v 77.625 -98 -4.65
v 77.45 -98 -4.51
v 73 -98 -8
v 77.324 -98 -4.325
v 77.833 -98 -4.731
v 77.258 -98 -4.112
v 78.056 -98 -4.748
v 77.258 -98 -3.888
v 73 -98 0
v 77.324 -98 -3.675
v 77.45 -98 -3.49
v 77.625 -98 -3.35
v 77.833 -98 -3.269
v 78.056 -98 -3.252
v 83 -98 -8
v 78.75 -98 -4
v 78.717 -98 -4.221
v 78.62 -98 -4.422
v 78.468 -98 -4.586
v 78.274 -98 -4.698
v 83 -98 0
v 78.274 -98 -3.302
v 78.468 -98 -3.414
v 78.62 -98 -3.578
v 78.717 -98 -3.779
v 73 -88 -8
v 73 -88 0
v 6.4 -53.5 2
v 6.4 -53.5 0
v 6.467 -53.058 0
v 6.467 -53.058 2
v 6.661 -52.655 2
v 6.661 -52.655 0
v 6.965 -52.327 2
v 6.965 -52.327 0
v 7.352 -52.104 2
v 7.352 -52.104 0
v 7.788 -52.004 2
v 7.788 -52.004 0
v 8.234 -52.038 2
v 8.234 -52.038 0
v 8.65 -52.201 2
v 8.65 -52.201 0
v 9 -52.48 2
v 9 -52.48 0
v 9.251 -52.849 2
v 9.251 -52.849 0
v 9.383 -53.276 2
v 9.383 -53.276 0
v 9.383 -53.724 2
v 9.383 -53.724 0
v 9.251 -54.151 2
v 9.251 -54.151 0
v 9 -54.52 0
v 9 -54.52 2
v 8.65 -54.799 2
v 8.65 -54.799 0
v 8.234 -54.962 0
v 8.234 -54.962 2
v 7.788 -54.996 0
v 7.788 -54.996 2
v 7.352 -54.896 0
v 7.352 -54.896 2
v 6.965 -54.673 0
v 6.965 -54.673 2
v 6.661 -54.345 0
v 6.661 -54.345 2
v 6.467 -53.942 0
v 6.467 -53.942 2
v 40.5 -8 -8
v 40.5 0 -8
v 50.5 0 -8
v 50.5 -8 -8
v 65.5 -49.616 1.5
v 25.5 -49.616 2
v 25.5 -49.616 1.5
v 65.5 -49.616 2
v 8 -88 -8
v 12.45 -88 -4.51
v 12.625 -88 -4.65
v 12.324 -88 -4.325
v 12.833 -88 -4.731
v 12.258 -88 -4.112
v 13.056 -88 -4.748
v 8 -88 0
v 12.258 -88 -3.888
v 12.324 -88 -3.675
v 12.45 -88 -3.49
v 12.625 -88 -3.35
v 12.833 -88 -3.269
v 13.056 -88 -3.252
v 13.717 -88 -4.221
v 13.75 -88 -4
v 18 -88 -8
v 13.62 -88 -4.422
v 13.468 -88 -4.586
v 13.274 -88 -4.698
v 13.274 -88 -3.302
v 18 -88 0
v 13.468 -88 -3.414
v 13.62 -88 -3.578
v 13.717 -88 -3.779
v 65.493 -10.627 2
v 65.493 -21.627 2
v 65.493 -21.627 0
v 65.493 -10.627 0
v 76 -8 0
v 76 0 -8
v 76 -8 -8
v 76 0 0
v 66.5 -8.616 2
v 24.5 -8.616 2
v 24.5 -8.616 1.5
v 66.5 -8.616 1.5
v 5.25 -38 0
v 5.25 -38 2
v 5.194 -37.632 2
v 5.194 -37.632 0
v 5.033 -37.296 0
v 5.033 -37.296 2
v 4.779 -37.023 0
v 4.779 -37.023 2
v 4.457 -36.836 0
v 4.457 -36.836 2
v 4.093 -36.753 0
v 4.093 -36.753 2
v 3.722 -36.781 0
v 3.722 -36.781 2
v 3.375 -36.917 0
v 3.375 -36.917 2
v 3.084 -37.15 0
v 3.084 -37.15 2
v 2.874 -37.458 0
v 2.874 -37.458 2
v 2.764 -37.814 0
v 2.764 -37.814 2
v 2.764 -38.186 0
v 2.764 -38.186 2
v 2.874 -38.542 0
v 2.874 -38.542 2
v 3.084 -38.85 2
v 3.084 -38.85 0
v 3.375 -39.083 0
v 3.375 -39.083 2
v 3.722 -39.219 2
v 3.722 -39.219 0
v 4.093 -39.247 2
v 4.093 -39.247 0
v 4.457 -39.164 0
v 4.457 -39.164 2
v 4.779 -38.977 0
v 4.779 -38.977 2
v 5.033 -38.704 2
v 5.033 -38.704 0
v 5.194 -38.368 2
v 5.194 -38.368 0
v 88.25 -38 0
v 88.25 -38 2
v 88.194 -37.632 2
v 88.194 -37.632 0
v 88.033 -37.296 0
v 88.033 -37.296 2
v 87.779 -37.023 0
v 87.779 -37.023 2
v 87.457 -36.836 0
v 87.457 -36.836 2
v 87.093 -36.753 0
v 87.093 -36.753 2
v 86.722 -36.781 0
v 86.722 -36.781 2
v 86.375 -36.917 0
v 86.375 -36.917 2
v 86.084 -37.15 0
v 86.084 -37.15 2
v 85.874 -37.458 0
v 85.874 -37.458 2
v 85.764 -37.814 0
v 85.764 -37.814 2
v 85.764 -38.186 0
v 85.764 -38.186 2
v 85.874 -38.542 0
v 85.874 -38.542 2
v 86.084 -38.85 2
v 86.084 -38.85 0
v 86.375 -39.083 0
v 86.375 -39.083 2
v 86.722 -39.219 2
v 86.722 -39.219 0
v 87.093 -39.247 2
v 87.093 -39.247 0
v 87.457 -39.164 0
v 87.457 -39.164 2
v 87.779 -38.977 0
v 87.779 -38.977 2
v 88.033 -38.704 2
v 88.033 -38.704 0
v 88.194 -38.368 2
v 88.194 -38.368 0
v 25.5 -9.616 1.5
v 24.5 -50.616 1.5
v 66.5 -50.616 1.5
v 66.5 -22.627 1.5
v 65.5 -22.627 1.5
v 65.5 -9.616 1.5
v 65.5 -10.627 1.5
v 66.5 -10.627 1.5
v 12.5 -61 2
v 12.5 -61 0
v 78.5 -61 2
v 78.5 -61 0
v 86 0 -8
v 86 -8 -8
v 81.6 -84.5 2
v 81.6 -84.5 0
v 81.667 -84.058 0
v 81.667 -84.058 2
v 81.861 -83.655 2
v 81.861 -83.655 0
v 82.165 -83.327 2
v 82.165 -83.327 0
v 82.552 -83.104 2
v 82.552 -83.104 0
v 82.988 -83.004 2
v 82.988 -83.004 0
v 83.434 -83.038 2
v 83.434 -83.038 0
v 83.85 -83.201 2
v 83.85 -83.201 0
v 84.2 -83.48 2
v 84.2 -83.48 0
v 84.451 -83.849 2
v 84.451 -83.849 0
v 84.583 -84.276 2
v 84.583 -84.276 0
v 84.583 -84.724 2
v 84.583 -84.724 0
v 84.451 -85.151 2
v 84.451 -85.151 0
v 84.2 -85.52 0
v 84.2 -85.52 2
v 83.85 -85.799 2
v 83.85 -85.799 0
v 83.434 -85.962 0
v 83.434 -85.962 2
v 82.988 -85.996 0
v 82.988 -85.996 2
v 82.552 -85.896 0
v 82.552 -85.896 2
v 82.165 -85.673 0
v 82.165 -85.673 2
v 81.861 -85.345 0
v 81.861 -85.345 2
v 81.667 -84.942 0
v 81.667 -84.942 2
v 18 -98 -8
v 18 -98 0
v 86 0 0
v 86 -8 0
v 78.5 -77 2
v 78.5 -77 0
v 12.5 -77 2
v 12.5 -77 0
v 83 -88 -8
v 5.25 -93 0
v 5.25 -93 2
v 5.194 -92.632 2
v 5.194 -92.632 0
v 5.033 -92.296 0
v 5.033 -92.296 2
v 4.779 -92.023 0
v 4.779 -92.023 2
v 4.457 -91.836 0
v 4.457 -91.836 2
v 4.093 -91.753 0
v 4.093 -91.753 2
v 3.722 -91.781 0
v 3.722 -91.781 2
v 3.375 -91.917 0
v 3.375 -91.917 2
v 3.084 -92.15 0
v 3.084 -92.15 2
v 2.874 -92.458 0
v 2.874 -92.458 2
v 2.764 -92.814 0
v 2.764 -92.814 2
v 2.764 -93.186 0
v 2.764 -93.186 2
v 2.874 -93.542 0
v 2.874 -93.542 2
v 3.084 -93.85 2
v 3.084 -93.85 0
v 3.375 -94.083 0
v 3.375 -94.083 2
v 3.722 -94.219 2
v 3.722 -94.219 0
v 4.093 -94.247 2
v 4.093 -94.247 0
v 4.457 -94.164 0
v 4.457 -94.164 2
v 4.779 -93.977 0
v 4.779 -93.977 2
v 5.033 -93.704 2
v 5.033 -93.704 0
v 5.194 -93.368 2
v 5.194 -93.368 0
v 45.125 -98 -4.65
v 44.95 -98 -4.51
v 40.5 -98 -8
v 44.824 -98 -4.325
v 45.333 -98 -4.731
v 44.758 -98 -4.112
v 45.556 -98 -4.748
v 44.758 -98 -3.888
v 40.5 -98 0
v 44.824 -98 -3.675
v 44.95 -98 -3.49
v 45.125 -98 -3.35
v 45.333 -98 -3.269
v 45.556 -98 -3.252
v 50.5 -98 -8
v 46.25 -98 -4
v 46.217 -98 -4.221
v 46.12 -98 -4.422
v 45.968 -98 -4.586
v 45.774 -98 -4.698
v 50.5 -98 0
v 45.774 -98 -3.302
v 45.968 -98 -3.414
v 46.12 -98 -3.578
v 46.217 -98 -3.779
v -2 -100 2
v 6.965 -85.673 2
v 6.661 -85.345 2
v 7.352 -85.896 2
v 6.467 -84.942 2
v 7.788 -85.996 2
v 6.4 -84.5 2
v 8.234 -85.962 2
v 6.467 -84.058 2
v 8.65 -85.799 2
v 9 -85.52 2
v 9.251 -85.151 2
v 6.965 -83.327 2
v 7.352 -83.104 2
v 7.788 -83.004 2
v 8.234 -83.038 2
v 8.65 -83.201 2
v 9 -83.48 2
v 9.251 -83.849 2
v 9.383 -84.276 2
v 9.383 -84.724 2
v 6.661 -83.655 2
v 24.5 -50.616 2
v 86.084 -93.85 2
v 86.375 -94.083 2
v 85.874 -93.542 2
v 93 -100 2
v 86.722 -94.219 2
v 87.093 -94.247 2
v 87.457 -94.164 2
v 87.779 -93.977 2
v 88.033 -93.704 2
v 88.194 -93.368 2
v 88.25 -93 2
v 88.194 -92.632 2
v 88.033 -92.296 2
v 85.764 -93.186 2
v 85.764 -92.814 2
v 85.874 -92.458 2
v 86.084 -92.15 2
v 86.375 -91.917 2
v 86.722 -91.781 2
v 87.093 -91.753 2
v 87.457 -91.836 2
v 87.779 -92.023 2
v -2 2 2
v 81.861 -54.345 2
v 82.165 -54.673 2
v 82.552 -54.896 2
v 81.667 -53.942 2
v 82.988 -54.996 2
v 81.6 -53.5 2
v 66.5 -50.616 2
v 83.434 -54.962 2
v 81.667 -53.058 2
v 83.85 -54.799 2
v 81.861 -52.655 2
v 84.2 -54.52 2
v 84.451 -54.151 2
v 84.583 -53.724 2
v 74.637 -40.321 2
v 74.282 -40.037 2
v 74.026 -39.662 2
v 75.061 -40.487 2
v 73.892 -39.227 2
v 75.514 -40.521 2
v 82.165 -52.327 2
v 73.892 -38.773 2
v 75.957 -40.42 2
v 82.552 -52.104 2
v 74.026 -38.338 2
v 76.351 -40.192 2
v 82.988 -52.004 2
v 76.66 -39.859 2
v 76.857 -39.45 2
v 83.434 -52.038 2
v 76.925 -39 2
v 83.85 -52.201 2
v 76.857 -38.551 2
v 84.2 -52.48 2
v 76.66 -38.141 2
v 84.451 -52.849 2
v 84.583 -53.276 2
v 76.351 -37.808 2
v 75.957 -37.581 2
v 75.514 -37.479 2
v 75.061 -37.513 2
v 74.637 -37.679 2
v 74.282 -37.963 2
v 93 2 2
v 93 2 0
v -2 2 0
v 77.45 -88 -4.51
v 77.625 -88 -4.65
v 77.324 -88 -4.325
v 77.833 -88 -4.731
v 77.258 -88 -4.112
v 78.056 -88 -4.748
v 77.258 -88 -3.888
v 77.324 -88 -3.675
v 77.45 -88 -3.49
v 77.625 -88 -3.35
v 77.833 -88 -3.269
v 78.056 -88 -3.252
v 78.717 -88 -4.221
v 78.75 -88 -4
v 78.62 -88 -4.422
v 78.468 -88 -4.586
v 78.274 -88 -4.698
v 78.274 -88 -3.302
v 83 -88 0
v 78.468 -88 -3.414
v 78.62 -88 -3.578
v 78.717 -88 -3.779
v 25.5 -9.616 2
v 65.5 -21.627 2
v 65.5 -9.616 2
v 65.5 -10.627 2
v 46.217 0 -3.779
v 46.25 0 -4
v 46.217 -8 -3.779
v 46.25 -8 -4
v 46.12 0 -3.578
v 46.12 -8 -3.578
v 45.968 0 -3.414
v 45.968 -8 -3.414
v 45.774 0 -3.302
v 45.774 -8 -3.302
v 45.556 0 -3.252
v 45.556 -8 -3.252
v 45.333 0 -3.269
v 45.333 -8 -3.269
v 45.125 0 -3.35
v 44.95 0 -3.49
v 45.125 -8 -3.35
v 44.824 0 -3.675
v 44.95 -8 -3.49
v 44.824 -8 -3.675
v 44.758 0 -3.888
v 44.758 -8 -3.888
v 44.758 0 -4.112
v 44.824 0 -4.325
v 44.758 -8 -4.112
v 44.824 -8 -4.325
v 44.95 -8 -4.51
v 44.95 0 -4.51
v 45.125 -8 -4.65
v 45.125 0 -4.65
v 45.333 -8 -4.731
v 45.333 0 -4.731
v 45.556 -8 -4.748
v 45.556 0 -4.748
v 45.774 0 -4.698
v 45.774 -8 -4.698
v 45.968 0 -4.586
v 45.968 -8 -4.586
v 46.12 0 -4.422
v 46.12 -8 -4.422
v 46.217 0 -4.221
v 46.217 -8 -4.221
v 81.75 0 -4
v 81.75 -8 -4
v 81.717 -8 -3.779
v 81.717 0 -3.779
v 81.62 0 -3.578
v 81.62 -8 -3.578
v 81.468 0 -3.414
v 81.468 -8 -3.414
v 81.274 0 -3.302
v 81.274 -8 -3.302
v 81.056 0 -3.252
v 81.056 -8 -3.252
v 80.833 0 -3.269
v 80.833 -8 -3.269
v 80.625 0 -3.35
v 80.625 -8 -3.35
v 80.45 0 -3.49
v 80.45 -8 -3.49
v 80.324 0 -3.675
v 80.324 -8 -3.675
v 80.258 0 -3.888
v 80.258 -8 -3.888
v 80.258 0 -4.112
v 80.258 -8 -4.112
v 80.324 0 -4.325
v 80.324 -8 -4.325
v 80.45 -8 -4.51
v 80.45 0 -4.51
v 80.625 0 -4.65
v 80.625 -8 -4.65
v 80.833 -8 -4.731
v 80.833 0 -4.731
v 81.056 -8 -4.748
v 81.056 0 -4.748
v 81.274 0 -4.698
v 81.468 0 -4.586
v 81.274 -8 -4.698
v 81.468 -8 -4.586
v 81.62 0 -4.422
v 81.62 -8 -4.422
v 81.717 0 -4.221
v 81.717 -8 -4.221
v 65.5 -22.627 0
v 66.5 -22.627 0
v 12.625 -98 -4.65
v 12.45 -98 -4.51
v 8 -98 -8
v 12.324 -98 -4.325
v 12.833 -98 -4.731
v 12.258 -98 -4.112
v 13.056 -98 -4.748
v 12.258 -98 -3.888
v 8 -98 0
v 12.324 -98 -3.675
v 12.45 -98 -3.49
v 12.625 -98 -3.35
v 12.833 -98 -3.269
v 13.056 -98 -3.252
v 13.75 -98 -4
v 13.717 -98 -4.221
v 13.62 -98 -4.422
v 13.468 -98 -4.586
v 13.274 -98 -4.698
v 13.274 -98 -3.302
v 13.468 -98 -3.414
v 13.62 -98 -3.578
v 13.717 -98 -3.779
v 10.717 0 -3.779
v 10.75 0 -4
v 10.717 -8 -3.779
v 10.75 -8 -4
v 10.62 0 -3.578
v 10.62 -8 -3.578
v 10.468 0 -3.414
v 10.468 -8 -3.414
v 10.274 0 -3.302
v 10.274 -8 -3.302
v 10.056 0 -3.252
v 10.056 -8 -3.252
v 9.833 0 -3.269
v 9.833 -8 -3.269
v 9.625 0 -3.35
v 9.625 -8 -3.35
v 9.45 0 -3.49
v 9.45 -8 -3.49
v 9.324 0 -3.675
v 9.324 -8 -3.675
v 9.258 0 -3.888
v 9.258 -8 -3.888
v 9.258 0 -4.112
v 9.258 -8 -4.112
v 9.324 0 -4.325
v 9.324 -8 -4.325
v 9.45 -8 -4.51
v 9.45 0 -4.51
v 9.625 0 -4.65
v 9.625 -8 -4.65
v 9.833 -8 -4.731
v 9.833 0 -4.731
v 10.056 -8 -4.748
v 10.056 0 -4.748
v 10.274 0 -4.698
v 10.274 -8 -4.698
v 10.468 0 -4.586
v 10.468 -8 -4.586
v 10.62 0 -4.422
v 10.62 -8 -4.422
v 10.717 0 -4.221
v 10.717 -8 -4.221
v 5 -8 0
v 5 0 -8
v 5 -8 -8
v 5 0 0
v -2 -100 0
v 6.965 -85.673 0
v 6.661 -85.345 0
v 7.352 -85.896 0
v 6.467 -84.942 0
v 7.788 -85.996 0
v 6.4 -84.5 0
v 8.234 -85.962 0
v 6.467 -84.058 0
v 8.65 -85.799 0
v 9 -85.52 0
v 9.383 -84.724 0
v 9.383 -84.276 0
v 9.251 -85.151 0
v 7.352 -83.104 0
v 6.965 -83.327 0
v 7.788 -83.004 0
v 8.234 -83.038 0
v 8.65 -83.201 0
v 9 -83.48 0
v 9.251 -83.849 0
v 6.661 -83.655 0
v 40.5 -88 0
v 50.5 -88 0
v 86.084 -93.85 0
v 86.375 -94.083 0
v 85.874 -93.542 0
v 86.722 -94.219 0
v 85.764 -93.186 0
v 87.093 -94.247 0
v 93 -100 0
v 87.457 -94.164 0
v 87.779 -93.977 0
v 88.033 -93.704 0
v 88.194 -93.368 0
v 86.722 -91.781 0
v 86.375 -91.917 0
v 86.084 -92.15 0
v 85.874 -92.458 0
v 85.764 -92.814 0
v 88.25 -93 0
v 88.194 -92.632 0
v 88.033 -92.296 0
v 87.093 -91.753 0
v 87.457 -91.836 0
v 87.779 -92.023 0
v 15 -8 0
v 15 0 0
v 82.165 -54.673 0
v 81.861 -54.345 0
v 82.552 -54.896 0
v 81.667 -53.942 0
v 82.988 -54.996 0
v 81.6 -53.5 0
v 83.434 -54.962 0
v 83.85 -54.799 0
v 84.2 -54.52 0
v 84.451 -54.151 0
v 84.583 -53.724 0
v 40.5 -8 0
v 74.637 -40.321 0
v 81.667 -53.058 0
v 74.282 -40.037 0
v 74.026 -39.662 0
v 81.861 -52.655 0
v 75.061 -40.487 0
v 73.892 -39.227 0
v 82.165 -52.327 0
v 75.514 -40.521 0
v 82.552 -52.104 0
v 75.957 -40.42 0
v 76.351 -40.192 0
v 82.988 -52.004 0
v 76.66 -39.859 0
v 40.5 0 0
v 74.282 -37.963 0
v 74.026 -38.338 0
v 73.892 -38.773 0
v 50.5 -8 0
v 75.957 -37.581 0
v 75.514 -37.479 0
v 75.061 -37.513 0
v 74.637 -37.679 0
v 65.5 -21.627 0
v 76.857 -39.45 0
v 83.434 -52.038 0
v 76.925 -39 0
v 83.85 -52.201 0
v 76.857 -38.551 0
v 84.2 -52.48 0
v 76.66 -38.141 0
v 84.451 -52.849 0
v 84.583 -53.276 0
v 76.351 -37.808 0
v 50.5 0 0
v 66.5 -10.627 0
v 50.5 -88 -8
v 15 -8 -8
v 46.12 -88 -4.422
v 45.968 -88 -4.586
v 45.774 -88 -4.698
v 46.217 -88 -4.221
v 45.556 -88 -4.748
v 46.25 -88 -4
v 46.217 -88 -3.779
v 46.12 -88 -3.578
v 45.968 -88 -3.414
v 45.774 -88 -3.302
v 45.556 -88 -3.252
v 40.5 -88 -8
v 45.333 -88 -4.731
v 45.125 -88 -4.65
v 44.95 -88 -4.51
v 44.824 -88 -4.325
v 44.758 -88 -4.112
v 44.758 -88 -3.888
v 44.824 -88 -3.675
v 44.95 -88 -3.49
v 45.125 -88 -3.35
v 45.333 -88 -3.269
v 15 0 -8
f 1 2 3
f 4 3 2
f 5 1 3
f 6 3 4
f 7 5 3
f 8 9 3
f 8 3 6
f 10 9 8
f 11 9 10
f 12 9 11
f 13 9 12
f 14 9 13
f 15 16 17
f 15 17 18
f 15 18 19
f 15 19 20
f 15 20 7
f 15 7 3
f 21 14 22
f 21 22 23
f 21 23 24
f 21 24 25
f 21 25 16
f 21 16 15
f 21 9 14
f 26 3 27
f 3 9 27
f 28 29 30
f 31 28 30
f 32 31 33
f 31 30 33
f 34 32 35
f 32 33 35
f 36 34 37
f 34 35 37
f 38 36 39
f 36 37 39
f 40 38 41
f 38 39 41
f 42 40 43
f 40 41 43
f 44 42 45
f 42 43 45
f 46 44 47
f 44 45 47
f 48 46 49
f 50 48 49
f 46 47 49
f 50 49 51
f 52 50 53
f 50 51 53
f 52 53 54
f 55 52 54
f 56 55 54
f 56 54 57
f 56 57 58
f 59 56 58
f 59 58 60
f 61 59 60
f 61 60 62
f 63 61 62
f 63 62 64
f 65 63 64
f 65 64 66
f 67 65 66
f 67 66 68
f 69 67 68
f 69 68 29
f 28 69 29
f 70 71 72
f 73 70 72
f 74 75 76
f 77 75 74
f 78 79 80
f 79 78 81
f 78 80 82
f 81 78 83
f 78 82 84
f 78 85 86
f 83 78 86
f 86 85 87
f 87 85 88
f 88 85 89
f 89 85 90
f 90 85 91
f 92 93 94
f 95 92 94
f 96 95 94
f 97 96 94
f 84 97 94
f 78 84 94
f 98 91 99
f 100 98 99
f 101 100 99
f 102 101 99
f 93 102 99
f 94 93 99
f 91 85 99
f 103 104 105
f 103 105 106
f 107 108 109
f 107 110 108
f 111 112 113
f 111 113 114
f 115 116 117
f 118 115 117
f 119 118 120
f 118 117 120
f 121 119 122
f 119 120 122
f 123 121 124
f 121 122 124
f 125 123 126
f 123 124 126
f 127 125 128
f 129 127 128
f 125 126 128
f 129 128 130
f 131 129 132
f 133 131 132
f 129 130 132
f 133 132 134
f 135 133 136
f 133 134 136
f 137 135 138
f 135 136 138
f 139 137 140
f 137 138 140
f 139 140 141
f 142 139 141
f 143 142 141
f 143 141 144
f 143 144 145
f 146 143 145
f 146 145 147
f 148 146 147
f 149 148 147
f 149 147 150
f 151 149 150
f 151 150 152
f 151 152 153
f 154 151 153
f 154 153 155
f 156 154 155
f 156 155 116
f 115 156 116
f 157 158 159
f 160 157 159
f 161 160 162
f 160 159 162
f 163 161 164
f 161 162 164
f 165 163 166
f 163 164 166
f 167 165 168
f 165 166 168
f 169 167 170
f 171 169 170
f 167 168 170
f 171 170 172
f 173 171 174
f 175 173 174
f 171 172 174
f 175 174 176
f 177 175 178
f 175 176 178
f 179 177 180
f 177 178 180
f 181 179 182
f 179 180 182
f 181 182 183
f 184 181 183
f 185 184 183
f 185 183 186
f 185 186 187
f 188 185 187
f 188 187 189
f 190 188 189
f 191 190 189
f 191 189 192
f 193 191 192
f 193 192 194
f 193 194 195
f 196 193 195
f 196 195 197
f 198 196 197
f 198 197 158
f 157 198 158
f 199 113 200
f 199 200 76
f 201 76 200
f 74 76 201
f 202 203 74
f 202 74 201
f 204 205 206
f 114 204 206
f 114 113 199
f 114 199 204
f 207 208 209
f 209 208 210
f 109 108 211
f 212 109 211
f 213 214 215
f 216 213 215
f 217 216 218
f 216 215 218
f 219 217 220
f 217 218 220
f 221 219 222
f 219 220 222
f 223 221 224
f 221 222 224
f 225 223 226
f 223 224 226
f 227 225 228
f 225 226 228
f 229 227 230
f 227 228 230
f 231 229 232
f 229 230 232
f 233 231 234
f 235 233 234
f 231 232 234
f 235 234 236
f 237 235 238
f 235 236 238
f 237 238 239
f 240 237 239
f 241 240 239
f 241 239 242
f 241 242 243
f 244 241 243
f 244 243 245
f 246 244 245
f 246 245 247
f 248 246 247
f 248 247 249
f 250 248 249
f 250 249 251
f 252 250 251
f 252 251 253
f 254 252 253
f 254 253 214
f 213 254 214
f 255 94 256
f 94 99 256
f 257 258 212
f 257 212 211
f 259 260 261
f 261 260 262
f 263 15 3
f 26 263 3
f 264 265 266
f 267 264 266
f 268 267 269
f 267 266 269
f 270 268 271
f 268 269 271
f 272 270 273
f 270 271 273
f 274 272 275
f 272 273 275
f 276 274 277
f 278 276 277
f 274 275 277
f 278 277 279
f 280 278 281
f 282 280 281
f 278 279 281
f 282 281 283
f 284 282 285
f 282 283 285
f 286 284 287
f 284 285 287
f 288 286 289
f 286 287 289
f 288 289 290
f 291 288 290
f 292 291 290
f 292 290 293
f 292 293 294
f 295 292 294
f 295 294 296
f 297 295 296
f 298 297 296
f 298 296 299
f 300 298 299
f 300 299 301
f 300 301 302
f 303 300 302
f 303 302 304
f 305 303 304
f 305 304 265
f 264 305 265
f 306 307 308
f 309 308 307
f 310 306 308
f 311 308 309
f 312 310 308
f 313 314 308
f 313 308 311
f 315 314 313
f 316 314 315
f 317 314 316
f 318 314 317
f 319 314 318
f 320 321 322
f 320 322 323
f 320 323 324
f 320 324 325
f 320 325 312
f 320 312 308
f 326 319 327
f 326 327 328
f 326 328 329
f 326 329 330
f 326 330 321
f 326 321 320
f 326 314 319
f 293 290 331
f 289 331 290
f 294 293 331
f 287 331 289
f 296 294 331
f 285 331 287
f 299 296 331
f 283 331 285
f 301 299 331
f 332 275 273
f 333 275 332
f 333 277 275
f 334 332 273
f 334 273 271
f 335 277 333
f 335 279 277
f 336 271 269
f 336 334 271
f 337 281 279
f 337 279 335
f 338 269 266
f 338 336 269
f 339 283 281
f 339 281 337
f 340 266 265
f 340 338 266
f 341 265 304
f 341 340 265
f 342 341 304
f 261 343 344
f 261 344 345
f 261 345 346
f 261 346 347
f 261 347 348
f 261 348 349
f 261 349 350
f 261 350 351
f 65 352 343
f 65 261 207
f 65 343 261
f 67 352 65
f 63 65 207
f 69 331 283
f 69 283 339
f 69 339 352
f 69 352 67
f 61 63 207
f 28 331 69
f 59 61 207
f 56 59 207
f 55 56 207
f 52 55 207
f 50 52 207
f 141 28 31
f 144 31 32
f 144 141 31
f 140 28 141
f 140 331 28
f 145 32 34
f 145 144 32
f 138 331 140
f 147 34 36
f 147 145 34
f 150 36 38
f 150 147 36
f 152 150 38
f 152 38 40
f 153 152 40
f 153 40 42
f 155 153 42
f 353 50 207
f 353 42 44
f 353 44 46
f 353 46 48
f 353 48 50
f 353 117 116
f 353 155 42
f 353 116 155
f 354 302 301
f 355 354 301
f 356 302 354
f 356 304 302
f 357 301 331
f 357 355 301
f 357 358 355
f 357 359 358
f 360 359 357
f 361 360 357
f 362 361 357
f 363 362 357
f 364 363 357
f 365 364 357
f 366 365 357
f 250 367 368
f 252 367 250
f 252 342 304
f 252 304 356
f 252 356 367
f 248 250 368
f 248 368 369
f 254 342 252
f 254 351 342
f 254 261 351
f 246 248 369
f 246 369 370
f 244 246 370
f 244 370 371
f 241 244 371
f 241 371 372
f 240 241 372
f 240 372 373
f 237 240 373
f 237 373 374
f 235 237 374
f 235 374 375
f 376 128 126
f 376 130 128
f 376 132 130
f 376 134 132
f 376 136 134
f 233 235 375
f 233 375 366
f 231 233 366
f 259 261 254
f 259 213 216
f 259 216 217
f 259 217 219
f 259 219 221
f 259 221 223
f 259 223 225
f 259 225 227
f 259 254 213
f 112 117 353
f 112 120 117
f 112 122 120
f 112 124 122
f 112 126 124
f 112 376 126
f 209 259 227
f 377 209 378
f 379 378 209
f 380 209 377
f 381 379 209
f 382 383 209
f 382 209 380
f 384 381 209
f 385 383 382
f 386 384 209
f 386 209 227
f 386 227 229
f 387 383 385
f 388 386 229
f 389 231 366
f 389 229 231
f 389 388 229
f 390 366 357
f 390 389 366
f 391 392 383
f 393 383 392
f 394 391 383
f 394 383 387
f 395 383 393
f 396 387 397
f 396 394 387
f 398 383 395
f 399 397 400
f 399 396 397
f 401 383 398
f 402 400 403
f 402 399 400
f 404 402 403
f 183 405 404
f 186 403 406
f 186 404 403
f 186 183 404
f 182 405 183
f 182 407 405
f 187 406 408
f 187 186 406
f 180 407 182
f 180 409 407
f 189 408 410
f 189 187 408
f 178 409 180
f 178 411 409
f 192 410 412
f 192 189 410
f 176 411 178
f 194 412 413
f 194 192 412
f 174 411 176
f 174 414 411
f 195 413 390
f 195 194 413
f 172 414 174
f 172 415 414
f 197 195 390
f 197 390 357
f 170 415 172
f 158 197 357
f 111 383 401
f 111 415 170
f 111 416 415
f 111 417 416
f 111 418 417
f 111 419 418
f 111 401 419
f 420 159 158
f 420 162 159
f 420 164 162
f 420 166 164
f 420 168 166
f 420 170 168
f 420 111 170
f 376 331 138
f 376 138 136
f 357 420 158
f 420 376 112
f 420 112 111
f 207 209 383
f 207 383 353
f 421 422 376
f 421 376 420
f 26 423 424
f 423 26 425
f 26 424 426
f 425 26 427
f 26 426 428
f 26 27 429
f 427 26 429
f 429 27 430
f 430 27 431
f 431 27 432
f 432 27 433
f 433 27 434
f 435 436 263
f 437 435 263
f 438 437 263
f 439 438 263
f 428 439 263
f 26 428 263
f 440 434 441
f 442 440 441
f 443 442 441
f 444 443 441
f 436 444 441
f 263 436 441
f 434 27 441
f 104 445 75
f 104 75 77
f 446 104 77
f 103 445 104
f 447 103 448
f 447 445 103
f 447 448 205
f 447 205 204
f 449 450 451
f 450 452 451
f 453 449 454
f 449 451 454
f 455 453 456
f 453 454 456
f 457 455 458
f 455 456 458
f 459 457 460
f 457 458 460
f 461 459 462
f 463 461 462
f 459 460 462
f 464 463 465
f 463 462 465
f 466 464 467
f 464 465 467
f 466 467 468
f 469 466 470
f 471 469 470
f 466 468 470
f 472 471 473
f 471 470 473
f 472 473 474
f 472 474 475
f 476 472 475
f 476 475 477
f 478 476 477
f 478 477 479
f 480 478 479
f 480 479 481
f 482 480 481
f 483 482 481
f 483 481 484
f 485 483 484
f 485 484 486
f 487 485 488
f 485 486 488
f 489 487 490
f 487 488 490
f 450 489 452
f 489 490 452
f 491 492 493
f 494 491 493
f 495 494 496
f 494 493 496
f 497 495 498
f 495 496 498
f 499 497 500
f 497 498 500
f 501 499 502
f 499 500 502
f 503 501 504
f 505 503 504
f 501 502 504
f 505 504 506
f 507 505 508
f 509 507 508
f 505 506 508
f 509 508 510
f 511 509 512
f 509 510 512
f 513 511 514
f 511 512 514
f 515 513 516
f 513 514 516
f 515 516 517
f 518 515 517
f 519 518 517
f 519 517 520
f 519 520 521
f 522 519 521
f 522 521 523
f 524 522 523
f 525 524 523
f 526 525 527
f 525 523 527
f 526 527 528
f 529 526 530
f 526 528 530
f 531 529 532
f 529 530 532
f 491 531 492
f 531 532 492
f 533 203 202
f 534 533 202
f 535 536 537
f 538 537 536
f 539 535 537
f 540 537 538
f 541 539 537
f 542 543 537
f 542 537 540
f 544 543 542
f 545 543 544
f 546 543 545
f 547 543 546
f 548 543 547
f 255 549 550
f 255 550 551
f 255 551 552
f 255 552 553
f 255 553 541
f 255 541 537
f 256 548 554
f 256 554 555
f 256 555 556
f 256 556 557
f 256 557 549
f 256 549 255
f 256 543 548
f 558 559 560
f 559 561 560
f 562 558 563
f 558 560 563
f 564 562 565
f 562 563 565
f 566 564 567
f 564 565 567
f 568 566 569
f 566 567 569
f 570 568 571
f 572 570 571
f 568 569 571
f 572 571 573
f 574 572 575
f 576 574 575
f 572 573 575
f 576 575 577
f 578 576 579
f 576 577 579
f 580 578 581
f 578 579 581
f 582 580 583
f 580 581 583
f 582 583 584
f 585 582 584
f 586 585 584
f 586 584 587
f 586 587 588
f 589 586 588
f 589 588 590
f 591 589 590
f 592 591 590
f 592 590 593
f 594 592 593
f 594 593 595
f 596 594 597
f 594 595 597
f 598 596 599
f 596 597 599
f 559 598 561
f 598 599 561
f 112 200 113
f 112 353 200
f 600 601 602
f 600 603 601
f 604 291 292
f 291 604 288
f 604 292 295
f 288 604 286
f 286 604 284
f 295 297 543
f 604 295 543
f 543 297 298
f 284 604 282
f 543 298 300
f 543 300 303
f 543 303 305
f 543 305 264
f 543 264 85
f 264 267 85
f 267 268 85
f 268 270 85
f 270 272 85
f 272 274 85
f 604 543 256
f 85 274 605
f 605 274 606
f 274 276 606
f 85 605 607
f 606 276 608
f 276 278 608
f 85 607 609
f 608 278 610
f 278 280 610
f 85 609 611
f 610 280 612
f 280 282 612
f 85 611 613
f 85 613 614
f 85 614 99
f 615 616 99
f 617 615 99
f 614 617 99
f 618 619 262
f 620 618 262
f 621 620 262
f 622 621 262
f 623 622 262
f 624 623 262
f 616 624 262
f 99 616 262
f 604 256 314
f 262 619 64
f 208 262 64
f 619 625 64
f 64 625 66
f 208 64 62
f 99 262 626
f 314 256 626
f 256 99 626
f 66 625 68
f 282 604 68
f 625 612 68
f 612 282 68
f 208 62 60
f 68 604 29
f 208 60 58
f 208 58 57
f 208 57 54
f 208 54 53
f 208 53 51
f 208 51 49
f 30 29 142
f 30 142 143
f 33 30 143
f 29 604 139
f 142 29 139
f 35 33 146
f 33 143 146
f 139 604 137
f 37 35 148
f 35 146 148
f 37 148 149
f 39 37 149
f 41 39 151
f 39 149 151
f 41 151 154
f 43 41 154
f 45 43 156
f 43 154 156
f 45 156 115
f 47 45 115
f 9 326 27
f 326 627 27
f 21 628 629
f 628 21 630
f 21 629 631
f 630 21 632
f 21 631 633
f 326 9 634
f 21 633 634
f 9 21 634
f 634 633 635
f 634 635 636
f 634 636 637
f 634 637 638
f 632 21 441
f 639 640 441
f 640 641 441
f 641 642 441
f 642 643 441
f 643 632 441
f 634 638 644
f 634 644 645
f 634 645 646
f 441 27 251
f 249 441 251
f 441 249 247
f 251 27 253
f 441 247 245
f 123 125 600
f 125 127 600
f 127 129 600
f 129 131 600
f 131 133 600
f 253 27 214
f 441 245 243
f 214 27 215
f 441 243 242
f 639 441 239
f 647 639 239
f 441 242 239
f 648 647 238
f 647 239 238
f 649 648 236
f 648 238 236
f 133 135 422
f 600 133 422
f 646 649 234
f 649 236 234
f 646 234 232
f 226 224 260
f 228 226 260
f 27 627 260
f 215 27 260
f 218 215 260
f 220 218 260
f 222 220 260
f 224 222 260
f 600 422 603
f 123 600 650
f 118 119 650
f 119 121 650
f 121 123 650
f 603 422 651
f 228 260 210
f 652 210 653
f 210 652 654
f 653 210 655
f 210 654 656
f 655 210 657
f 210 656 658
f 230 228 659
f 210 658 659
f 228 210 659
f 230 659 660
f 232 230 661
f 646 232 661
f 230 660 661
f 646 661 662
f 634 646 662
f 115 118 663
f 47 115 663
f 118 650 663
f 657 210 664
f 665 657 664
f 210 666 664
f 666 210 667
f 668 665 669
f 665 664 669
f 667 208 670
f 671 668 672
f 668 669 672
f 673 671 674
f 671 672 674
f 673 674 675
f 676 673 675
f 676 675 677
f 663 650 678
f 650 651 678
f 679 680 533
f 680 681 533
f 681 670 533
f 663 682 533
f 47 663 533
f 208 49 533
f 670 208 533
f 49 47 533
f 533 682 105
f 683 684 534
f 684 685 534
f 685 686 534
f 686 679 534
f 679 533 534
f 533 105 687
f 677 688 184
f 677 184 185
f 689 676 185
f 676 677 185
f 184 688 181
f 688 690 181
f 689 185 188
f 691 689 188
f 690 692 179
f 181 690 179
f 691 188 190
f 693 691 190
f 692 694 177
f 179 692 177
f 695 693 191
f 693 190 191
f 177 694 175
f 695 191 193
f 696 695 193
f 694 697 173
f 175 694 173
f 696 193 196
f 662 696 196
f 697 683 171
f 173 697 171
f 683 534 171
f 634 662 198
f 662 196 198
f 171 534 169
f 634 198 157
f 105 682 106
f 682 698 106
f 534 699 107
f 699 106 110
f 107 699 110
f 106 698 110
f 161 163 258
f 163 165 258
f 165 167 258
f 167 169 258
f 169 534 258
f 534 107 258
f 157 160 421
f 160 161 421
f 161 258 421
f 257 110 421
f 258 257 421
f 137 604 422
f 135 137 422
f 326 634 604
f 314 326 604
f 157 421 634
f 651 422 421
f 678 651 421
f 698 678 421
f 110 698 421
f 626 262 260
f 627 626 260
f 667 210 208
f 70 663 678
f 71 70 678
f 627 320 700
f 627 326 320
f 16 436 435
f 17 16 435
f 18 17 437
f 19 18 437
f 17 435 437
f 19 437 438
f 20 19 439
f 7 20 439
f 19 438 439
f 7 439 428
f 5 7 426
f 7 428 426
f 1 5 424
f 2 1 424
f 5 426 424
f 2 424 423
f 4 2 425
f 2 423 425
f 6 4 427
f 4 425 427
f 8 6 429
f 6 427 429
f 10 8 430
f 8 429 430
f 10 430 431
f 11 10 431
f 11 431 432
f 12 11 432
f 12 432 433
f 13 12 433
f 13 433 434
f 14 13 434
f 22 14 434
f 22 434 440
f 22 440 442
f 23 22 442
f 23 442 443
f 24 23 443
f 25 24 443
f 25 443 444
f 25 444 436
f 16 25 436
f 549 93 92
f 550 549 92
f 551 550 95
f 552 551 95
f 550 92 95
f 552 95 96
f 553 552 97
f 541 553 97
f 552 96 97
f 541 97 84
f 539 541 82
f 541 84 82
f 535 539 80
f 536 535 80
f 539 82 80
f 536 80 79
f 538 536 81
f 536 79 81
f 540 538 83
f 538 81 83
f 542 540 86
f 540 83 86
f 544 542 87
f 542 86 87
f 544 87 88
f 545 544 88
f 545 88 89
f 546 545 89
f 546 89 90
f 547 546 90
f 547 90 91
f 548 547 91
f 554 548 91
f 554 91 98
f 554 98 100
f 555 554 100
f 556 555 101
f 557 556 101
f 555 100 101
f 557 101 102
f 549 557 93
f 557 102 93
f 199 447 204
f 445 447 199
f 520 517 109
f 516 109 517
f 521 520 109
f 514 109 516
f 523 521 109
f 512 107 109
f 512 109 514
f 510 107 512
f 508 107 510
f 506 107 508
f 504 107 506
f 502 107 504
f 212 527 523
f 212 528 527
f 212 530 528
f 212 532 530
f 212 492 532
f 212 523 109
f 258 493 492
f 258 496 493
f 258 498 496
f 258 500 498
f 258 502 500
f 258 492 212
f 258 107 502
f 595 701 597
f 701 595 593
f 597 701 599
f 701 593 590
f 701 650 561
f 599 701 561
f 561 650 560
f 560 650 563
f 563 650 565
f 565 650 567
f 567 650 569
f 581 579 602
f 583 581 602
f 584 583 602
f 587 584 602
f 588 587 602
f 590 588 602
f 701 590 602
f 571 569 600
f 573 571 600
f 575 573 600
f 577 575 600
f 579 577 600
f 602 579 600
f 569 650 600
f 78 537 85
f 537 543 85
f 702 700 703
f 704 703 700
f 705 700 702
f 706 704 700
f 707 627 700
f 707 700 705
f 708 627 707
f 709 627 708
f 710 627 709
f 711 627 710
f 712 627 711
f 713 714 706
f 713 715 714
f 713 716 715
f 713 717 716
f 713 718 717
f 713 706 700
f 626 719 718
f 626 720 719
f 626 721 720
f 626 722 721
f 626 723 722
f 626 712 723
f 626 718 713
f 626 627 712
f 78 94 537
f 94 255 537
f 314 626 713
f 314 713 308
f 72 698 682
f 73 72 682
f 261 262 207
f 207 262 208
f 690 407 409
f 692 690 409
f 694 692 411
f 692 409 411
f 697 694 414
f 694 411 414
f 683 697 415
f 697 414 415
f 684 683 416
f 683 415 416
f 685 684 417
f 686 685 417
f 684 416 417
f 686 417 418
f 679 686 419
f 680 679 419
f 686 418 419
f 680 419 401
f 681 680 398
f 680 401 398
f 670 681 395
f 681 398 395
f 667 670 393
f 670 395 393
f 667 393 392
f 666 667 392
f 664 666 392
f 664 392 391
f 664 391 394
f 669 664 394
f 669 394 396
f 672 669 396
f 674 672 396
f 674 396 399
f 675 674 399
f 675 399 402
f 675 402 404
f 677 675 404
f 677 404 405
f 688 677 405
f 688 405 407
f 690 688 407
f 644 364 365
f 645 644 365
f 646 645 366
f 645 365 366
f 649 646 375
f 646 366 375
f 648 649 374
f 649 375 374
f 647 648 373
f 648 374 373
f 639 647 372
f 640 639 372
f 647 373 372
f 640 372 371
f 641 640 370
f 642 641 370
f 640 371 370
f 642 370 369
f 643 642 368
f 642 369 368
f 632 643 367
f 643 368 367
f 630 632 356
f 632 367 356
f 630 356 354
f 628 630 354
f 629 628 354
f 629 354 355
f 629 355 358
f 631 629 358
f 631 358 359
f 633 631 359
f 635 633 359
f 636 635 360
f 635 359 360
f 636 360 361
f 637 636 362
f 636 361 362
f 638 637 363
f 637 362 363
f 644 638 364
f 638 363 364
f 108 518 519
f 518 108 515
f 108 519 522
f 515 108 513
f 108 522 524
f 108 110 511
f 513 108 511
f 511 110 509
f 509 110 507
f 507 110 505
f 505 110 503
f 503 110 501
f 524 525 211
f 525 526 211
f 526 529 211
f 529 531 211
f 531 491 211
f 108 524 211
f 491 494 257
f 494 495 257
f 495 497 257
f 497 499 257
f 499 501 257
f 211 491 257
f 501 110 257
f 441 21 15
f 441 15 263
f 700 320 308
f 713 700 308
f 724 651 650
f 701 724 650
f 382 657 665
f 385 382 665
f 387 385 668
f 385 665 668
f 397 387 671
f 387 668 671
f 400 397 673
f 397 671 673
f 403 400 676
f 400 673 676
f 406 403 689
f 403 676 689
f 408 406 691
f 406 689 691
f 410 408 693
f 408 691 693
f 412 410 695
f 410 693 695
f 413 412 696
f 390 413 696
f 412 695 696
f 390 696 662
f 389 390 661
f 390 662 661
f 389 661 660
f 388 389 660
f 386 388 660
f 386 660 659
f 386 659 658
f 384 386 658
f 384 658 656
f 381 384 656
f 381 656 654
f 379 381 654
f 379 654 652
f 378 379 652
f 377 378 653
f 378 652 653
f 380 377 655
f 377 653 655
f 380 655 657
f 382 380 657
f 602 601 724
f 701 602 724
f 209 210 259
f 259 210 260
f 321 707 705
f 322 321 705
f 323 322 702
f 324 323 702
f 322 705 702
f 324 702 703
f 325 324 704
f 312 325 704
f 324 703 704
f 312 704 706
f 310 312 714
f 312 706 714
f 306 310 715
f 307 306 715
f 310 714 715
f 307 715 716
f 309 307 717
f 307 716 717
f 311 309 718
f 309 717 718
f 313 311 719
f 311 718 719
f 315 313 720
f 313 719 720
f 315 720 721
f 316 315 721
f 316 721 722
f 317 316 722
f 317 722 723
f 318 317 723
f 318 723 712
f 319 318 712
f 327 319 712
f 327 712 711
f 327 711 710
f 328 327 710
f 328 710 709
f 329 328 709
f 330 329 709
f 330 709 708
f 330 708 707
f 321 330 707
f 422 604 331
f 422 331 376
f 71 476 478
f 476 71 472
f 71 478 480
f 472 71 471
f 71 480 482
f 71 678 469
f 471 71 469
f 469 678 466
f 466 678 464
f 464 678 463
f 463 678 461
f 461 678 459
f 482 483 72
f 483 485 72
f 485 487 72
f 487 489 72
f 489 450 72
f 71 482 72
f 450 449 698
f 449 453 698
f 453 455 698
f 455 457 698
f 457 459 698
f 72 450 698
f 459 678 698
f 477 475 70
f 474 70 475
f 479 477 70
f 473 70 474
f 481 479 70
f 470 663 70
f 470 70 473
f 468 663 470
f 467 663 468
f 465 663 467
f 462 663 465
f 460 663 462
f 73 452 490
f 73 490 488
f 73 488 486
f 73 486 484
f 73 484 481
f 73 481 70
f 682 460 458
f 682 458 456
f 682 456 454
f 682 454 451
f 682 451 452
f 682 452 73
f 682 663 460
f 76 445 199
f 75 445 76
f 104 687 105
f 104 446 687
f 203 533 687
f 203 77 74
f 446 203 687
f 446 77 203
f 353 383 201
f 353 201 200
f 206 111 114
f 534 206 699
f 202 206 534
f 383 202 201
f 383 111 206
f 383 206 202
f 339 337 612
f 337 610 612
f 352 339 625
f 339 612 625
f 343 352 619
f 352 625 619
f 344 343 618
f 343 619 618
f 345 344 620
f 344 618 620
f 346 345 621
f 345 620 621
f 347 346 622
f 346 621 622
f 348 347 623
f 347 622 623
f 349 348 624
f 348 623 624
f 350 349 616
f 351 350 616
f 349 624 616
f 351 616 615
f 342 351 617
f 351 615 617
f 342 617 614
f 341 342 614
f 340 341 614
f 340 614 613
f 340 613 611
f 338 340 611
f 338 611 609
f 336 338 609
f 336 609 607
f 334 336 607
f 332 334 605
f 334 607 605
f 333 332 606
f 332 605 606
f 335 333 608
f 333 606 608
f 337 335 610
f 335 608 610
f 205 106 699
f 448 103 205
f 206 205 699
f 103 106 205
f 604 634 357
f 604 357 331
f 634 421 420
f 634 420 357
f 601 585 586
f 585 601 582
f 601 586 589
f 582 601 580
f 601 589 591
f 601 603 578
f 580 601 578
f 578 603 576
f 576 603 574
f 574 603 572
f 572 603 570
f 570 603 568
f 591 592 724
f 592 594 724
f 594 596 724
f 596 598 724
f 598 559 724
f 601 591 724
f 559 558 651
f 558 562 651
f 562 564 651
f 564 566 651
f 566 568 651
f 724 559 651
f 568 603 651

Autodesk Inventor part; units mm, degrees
ref_plane "YZ Plane" through (0, 0, 0) normal (1, 0, 0) x (0, 1, 0)
ref_plane "XZ Plane" through (0, 0, 0) normal (0, 1, 0) x (-1, 0, 0)
ref_plane "XY Plane" through (0, 0, 0) normal (0, 0, 1) x (1, 0, 0)
ref_plane "Work Plane1" through (0, 0, 0) normal (0, 0, 1) x (1, 0, 0)
sketch "Sketch1" plane through (0, 0, 0) normal (0, 0, 1) x (1, 0, 0)
  line L0 (5, 0) -> (86, 0) projected
  line L1 (86, -8) -> (86, 0) projected
  line L2 (5, 0) -> (5, -8) projected
  line L3 (43, 0) -> (43, -8) projected
  line L4 (53, -8) -> (53, 0) projected
  line L5 (86, 0) -> (76, 0)
  line L6 (76, 0) -> (76, -8)
  line L7 (76, -8) -> (86, -8)
  line L8 (86, -8) -> (86, 0)
  line L9 (5, 0) -> (15, 0)
  line L10 (15, 0) -> (15, -8)
  line L11 (15, -8) -> (5, -8)
  line L12 (5, -8) -> (5, 0)
  point P0 (0, 0)
  dimension "d0" = 10
  dimension "d1" = 8
  dimension "d3" = 10
  dimension "d4" = 8
extrude "Extrusion1" add sketch "Sketch1" against normal blind 8
sketch "Sketch2" plane through (0, 0, 0) normal (0, 0, 1) x (1, 0, 0)
  line L0 (15, 0) -> (15, -8) projected
  line L1 (76, -8) -> (76, 0) projected
  line L2 (15, -8) -> (76, -8)
  line L3 (45.5, -8) -> (40.5, -8)
  line L4 (40.5, -8) -> (40.5, 0)
  line L5 (40.5, 0) -> (50.5, 0)
  line L6 (50.5, 0) -> (50.5, -8)
  point P0 (0, 0)
  dimension "d7" = 5
  dimension "d8" = 10
extrude "Extrusion2" add sketch "Sketch2" against normal blind 8
sketch "Sketch3" plane through (76, -8, 0) normal (0, -1, 0) x (1, 0, 0)
  line L0 (10, -8) -> (0, -8) projected
  circle A0 centre (5, -4) radius 0.75
  line L1 (-25.5, -8) -> (-35.5, -8) projected
  circle A1 centre (-30.5, -4) radius 0.75
  line L2 (-61, -8) -> (-71, -8) projected
  circle A2 centre (-66, -4) radius 0.75
  point P0 (-76, 0)
  dimension "d12" = 1.5
  dimension "d14" = 1.5
  dimension "d16" = 1.5
extrude "Extrusion3" cut sketch "Sketch3" against normal blind 8
ref_plane "Work Plane2" through (93, -98, 0) normal (0, 0, 1) x (-1, 0, 0)
sketch "Sketch4" plane through (93, -98, 0) normal (0, 0, 1) x (-1, 0, 0)
  line L0 (10, 0) -> (10, -10) projected
  line L1 (85, 0) -> (85, -10) projected
  line L2 (95, 0) -> (0, 0) projected
  line L3 (10, 0) -> (20, 0)
  line L4 (20, 0) -> (20, -10)
  line L5 (20, -10) -> (10, -10)
  line L6 (10, -10) -> (10, 0)
  line L7 (85, -10) -> (75, -10)
  line L8 (75, -10) -> (75, 0)
  line L9 (75, 0) -> (85, 0)
  line L10 (85, 0) -> (85, -10)
  line L11 (75, 0) -> (20, 0)
  line L12 (47.5, -10) -> (52.5, -10)
  line L13 (52.5, -10) -> (52.5, 0)
  line L14 (52.5, 0) -> (42.5, 0)
  line L15 (42.5, 0) -> (42.5, -10)
  line L16 (42.5, -10) -> (47.5, -10)
  point P0 (93, -98)
  dimension "d19" = 10
  dimension "d20" = 10
  dimension "d21" = 10
  dimension "d22" = 10
  dimension "d24" = 5
  dimension "d25" = 10
  dimension "d26" = 10
  dimension "d27" = 10
extrude "Extrusion4" add sketch "Sketch4" against normal blind 8
sketch "Sketch5" plane through (73, -88, 0) normal (0, 1, 0) x (1, 0, 0)
  line L0 (10, 0) -> (0, 0) projected
  circle A0 centre (5, 4) radius 0.75
  line L1 (-22.5, 0) -> (-32.5, 0) projected
  circle A1 centre (-27.5, 4) radius 0.75
  line L2 (-55, 0) -> (-65, 0) projected
  circle A2 centre (-60, 4) radius 0.75
  point P0 (-73, 0)
  dimension "d31" = 1.5
  dimension "d33" = 1.5
  dimension "d35" = 1.5
extrude "Extrusion5" cut sketch "Sketch5" against normal blind 10
sketch "Sketch6" plane through (93, -98, 0) normal (0, 0, 1) x (1, 0, 0)
  line L0 (0, 0) -> (0, -2) projected
  line L1 (-93, 100) -> (-95, 100) projected
  line L2 (-95, 100) -> (0, 100)
  line L3 (0, 100) -> (0, -2)
  line L4 (0, -2) -> (-95, -2)
  line L5 (-95, -2) -> (-95, 100)
  circle A0 centre (-6, 50) radius 0.75 projected
  circle A1 centre (-6, 5) radius 0.75 projected
  circle A2 centre (-89, 5) radius 0.75 projected
  circle A3 centre (-89, 50) radius 0.75 projected
  point P0 (-93, 98)
extrude "Extrusion6" add sketch "Sketch6" along normal blind 2
sketch "Sketch7" plane through (93, -98, 0) normal (0, 0, -1) x (-1, 0, 0)
  line L0 (42.5, 90) -> (52.5, 90) projected
  line L1 (47.5, 84) -> (80.5, 84)
  line L2 (80.5, 84) -> (80.5, 68)
  line L3 (80.5, 68) -> (14.5, 68)
  line L4 (14.5, 68) -> (14.5, 84)
  line L5 (14.5, 84) -> (47.5, 84)
  point P0 (93, 98)
  dimension "d41" = 33
  dimension "d42" = 16
  dimension "d43" = 66
extrude "Extrusion7" cut sketch "Sketch7" against normal blind 2
sketch "Sketch8" plane through (93, -98, 0) normal (0, 0, -1) x (-1, 0, 0)
  line L0 (14.5, 84) -> (80.5, 84) projected
  circle A0 centre (85.1, 86.9) radius 1.375
  circle A1 centre (9.9, 86.9) radius 1.375
  line L1 (80.5, 68) -> (14.5, 68) projected
  circle A2 centre (9.9, 65.1) radius 1.375
  circle A3 centre (85.1, 65.1) radius 1.375
  point P0 (93, 98)
  dimension "d50" = 2.75
  dimension "d54" = 2.75
  dimension "d61" = 2.75
  dimension "d64" = 2.75
extrude "Extrusion8" cut sketch "Sketch8" against normal blind 2
sketch "Sketch9" plane through (93, -98, 2) normal (0, 0, 1) x (1, 0, 0)
  line L0 (-88, 88.797) -> (-7.6952, 88.797)
  line L1 (-7.6952, 88.797) -> (-7.6952, 63.1475)
  line L2 (-7.6952, 63.1475) -> (-88, 63.1475)
  line L3 (-88, 63.1475) -> (-88, 88.797)
  point P0 (-93, 98)
extrude "Extrusion9" add sketch "Sketch9" against normal blind 2
sketch "Sketch10" plane through (93, -98, 0) normal (0, 0, -1) x (-1, 0, 0)
  line L0 (42.5, 10) -> (52.5, 10) projected
  line L1 (47.5, 16) -> (14.5, 16)
  line L2 (14.5, 16) -> (14.5, 32)
  line L3 (14.5, 32) -> (80.5, 32)
  line L4 (80.5, 32) -> (80.5, 16)
  line L5 (80.5, 16) -> (47.5, 16)
  circle A0 centre (9.9, 13.1) radius 1.375
  circle A1 centre (85.1, 13.1) radius 1.375
  line L6 (47.5, 32) -> (47.5, 37.4)
  circle A2 centre (85.1, 34.9) radius 1.375
  circle A3 centre (9.9, 34.9) radius 1.375
  point P0 (93, 98)
  dimension "d70" = 33
  dimension "d71" = 16
  dimension "d72" = 66
  dimension "d73" = 16
  dimension "d74" = 33
  dimension "d80" = 2.75
  dimension "d83" = 2.75
  dimension "d84" = 5.4
  dimension "d89" = 2.75
  dimension "d92" = 2.75
extrude "Extrusion10" cut sketch "Sketch10" against normal blind 2
sketch "Sketch11" plane through (93, -98, 0) normal (0, 0, -1) x (-1, 0, 0)
  circle A0 centre (85.1, 13.1) radius 1.375 projected
  line L0 (8.0573, 36.8158) -> (87.4686, 36.8158)
  line L1 (87.4686, 36.8158) -> (87.4686, 10.2199)
  line L2 (87.4686, 10.2199) -> (8.0573, 10.2199)
  line L3 (8.0573, 10.2199) -> (8.0573, 36.8158)
  point P0 (93, 98)
extrude "Extrusion11" add sketch "Sketch11" against normal blind 2
sketch "Sketch12" plane through (93, -98, 0) normal (0, 0, -1) x (-1, 0, 0)
  line L0 (82.8776, 15.0849) -> (86.9969, 15.0849)
  line L1 (86.9969, 15.0849) -> (86.9969, 11.175)
  line L2 (86.9969, 11.175) -> (82.8776, 11.175)
  line L3 (82.8776, 11.175) -> (82.8776, 15.0849)
  point P0 (93, 98)
extrude "Extrusion12" add sketch "Sketch12" against normal blind 2
sketch "Sketch13" plane through (93, -98, 0) normal (0, 0, -1) x (-1, 0, 0)
  line L0 (42.5, 10) -> (52.5, 10) projected
  circle A0 centre (85.1, 22.5) radius 2.75
  point P0 (93, 98)
  dimension "d104" = 5.5
extrude "Extrusion13" cut sketch "Sketch13" against normal blind 2
sketch "Sketch14" plane through (93, -98, 2) normal (0, 0, 1) x (1, 0, 0)
  line L0 (-88.4753, 26.414) -> (-81.2801, 26.414)
  line L1 (-81.2801, 26.414) -> (-81.2801, 18.3554)
  line L2 (-81.2801, 18.3554) -> (-88.4753, 18.3554)
  line L3 (-88.4753, 18.3554) -> (-88.4753, 26.414)
  point P0 (-93, 98)
extrude "Extrusion14" add sketch "Sketch14" against normal blind 2
sketch "Sketch15" plane through (93, -98, 2) normal (0, 0, 1) x (1, 0, 0)
  point P0 (-93, 98)
sketch "Sketch16" plane through (93, -98, 0) normal (0, 0, -1) x (-1, 0, 0)
  line L0 (52.5, 90) -> (42.5, 90) projected
  circle A0 centre (9.9, 81.5) radius 1.5
  point P0 (93, 98)
  dimension "d118" = 3
extrude "Extrusion15" cut sketch "Sketch16" against normal blind 2
sketch "Sketch17" plane through (93, -98, 0) normal (0, 0, -1) x (-1, 0, 0)
  line L0 (7.2985, 84.1851) -> (12.7093, 84.1851)
  line L1 (12.7093, 84.1851) -> (12.7093, 78.544)
  line L2 (12.7093, 78.544) -> (7.2985, 78.544)
  line L3 (7.2985, 78.544) -> (7.2985, 84.1851)
  point P0 (93, 98)
extrude "Extrusion16" add sketch "Sketch17" against normal blind 2
sketch "Sketch18" plane through (93, -98, 0) normal (0, 0, -1) x (-1, 0, 0)
  line L0 (42.5, 10) -> (52.5, 10) projected
  circle A0 centre (85.1, 18.5) radius 1.5
  point P0 (93, 98)
  dimension "d127" = 3
extrude "Extrusion17" cut sketch "Sketch18" against normal blind 2
sketch "Sketch19" plane through (93, -98, 0) normal (0, 0, -1) x (-1, 0, 0)
  line L0 (42.5, 10) -> (52.5, 10) projected
  circle A0 centre (9.9, 18.5) radius 1.5
  point P0 (93, 98)
  dimension "d134" = 3
extrude "Extrusion18" cut sketch "Sketch19" against normal blind 2
sketch "Sketch20" plane through (93, -98, 0) normal (0, 0, -1) x (-1, 0, 0)
  line L0 (6.951, 21.791) -> (88.5357, 21.791)
  line L1 (88.5357, 21.791) -> (88.5357, 14.1465)
  line L2 (88.5357, 14.1465) -> (6.951, 14.1465)
  line L3 (6.951, 14.1465) -> (6.951, 21.791)
  point P0 (93, 98)
extrude "Extrusion19" add sketch "Sketch20" against normal blind 2
sketch "Sketch21" plane through (93, -98, 0) normal (0, 0, -1) x (-1, 0, 0)
  line L0 (42.5, 10) -> (52.5, 10) projected
  circle A0 centre (85.1, 13.5) radius 1.5
  circle A1 centre (9.9, 13.5) radius 1.5
  line L1 (47.5, 21) -> (80.5, 21)
  line L2 (80.5, 21) -> (80.5, 37)
  line L3 (80.5, 37) -> (14.5, 37)
  line L4 (14.5, 37) -> (14.5, 21)
  line L5 (14.5, 21) -> (47.5, 21)
  circle A2 centre (9.9, 44.5) radius 1.5
  circle A3 centre (85.1, 44.5) radius 1.5
  point P0 (93, 98)
  dimension "d143" = 3
  dimension "d147" = 3
  dimension "d150" = 33
  dimension "d151" = 16
  dimension "d152" = 66
  dimension "d157" = 3
  dimension "d161" = 3
extrude "Extrusion20" cut sketch "Sketch21" against normal blind 2
sketch "Sketch22" plane through (93, -98, 0) normal (0, 0, -1) x (-1, 0, 0)
  line L0 (88.1, 50.9663) -> (90.0333, 50.9663)
  line L1 (90.0333, 50.9663) -> (90.0333, 48.9675)
  line L2 (90.0333, 48.9675) -> (88.1, 48.9675)
  line L3 (88.1, 48.9675) -> (88.1, 50.9663)
  line L4 (5.046, 50.7936) -> (6.9554, 50.7936)
  line L5 (6.9554, 50.7936) -> (6.9554, 48.9675)
  line L6 (6.9554, 48.9675) -> (5.046, 48.9675)
  line L7 (5.046, 48.9675) -> (5.046, 50.7936)
  point P0 (93, 98)
extrude "Extrusion21" add sketch "Sketch22" against normal blind 2
sketch "Sketch23" plane through (93, -98, 2) normal (0, 0, 1) x (1, 0, 0)
  point P0 (-93, 98)
  point P1 (-57.8, 88.8806)
  point P2 (-56.6, 85.3806)
sketch "Sketch24" plane through (93, -98, 2) normal (0, 0, 1) x (1, 0, 0)
  circle A0 centre (-89, 60) radius 0.75 projected
  point P0 (-93, 98)
extrude "Extrusion22" cut sketch "Sketch24" against normal blind 2
sketch "Sketch25" plane through (93, -98, 2) normal (0, 0, 1) x (1, 0, 0)
  circle A0 centre (-89, 60) radius 0.75 projected
  circle A1 centre (-89, 60) radius 1.25
  point P0 (-93, 98)
  dimension "d168" = 2.5
extrude "Extrusion23" cut sketch "Sketch25" against normal blind 2
sketch "Sketch26" plane through (93, -98, 2) normal (0, 0, 1) x (1, 0, 0)
  circle A0 centre (-89, 5) radius 0.75 projected
  circle A1 centre (-89, 5) radius 1.25
  circle A2 centre (-6, 5) radius 0.75 projected
  circle A3 centre (-6, 5) radius 1.25
  point P0 (-93, 98)
  dimension "d171" = 2.5
  dimension "d172" = 2.5
extrude "Extrusion24" cut sketch "Sketch26" against normal blind 2 contours A0 | A1 | A3
sketch "Sketch27" plane through (93, -98, 2) normal (0, 0, 1) x (1, 0, 0)
  point P0 (-93, 98)
sketch "Sketch28" plane through (93, -98, 2) normal (0, 0, 1) x (1, 0, 0)
  circle A0 centre (-6, 60) radius 0.75 projected
  circle A1 centre (-6, 60) radius 1.25
  point P0 (-93, 98)
  dimension "d175" = 2.5
extrude "Extrusion25" cut sketch "Sketch28" against normal blind 2 contours A0 | A1
sketch "Sketch29" plane through (93, -98, 2) normal (0, 0, 1) x (1, 0, 0)
  circle A0 centre (-17.6001, 58.9999) radius 1.525 projected
  point P0 (-93, 98)
extrude "Extrusion26" cut sketch "Sketch29" against normal blind 2
sketch "Sketch30" plane through (93, -98, 2) normal (0, 0, 1) x (1, 0, 0)
  line L0 (-14.5, 37) -> (-80.5, 37) projected
  line L1 (-47.5, 37) -> (-47.5, 99.7686)
  line L2 (-27.5, 88.3843) -> (-67.5, 88.3843)
  line L3 (-67.5, 88.3843) -> (-67.5, 48.3843)
  line L4 (-67.5, 48.3843) -> (-27.5, 48.3843)
  line L5 (-27.5, 48.3843) -> (-27.5, 88.3843)
  line L6 (-27.5, 88.3843) -> (-67.5, 48.3843) construction
  line L7 (-67.5, 88.3843) -> (-27.5, 48.3843) construction
  line L8 (-26.5, 47.3843) -> (-68.5, 47.3843)
  line L9 (-68.5, 47.3843) -> (-68.5, 89.3843)
  line L10 (-68.5, 89.3843) -> (-26.5, 89.3843)
  line L11 (-26.5, 89.3843) -> (-26.5, 47.3843)
  point P0 (-93, 98)
  point P1 (-47.5, 68.3843)
  dimension "d180" = 40
  dimension "d181" = 40
  dimension "d182" = 1
extrude "Extrusion27" cut sketch "Sketch30" against normal blind 0.5 contours L8 L9 L10 L1 L2 L3 L4 | L1 L4 L5 L2 L10 L11 L8
sketch "Sketch31" plane through (93, -98, 2) normal (0, 0, 1) x (1, 0, 0)
  line L0 (-27.5066, 88.3731) -> (-27.5066, 87.3731)
  line L1 (-26.5, 89.3843) -> (-26.5, 47.3843) projected
  line L2 (-27.5066, 87.3731) -> (-26.5, 87.3731)
  line L3 (-26.5, 87.3731) -> (-26.5, 76.3731)
  line L4 (-26.5, 76.3731) -> (-27.5066, 76.3731)
  line L5 (-27.5066, 76.3731) -> (-27.5066, 87.3731)
  point P0 (-93, 98)
  dimension "d185" = 1
  dimension "d186" = 11
extrude "Extrusion28" cut sketch "Sketch31" against normal blind 1.5
sketch "Sketch32" plane through (93, -98, 0.5) normal (0, 0, 1) x (1, 0, 0)
  line L0 (-26.5, 76.3731) -> (-26.5, 47.3843) projected
  line L1 (-27.5066, 76.3731) -> (-27.5066, 87.3731) projected
  line L2 (-26.5, 76.3731) -> (-27.5066, 76.3731)
  line L3 (-27.5066, 76.3731) -> (-27.5066, 87.3731)
  line L4 (-27.5066, 87.3731) -> (-26.5, 87.3731)
  line L5 (-26.5, 87.3731) -> (-26.5, 76.3731)
  point P0 (-93, 98)
extrude "Extrusion29" cut sketch "Sketch32" against normal blind 0.5
sketch "Sketch33" plane through (93, -98, 1.5) normal (0, 0, 1) x (1, 0, 0)
  line L0 (-26.5, 76.3731) -> (-27.5, 76.3731) projected
  line L1 (-27.5, 48.3843) -> (-27.5, 76.3731) projected
  line L2 (-26.5, 76.3731) -> (-27.5, 76.3731)
  line L3 (-27.5, 76.3731) -> (-27.5, 75.3731)
  line L4 (-27.5, 75.3731) -> (-26.5, 75.3731)
  line L5 (-26.5, 75.3731) -> (-26.5, 76.3731)
  point P0 (-93, 98)
  dimension "d191" = 1
extrude "Extrusion30" cut sketch "Sketch33" against normal blind 1.5
properties part number "Front" material "Nylon 6/6"
